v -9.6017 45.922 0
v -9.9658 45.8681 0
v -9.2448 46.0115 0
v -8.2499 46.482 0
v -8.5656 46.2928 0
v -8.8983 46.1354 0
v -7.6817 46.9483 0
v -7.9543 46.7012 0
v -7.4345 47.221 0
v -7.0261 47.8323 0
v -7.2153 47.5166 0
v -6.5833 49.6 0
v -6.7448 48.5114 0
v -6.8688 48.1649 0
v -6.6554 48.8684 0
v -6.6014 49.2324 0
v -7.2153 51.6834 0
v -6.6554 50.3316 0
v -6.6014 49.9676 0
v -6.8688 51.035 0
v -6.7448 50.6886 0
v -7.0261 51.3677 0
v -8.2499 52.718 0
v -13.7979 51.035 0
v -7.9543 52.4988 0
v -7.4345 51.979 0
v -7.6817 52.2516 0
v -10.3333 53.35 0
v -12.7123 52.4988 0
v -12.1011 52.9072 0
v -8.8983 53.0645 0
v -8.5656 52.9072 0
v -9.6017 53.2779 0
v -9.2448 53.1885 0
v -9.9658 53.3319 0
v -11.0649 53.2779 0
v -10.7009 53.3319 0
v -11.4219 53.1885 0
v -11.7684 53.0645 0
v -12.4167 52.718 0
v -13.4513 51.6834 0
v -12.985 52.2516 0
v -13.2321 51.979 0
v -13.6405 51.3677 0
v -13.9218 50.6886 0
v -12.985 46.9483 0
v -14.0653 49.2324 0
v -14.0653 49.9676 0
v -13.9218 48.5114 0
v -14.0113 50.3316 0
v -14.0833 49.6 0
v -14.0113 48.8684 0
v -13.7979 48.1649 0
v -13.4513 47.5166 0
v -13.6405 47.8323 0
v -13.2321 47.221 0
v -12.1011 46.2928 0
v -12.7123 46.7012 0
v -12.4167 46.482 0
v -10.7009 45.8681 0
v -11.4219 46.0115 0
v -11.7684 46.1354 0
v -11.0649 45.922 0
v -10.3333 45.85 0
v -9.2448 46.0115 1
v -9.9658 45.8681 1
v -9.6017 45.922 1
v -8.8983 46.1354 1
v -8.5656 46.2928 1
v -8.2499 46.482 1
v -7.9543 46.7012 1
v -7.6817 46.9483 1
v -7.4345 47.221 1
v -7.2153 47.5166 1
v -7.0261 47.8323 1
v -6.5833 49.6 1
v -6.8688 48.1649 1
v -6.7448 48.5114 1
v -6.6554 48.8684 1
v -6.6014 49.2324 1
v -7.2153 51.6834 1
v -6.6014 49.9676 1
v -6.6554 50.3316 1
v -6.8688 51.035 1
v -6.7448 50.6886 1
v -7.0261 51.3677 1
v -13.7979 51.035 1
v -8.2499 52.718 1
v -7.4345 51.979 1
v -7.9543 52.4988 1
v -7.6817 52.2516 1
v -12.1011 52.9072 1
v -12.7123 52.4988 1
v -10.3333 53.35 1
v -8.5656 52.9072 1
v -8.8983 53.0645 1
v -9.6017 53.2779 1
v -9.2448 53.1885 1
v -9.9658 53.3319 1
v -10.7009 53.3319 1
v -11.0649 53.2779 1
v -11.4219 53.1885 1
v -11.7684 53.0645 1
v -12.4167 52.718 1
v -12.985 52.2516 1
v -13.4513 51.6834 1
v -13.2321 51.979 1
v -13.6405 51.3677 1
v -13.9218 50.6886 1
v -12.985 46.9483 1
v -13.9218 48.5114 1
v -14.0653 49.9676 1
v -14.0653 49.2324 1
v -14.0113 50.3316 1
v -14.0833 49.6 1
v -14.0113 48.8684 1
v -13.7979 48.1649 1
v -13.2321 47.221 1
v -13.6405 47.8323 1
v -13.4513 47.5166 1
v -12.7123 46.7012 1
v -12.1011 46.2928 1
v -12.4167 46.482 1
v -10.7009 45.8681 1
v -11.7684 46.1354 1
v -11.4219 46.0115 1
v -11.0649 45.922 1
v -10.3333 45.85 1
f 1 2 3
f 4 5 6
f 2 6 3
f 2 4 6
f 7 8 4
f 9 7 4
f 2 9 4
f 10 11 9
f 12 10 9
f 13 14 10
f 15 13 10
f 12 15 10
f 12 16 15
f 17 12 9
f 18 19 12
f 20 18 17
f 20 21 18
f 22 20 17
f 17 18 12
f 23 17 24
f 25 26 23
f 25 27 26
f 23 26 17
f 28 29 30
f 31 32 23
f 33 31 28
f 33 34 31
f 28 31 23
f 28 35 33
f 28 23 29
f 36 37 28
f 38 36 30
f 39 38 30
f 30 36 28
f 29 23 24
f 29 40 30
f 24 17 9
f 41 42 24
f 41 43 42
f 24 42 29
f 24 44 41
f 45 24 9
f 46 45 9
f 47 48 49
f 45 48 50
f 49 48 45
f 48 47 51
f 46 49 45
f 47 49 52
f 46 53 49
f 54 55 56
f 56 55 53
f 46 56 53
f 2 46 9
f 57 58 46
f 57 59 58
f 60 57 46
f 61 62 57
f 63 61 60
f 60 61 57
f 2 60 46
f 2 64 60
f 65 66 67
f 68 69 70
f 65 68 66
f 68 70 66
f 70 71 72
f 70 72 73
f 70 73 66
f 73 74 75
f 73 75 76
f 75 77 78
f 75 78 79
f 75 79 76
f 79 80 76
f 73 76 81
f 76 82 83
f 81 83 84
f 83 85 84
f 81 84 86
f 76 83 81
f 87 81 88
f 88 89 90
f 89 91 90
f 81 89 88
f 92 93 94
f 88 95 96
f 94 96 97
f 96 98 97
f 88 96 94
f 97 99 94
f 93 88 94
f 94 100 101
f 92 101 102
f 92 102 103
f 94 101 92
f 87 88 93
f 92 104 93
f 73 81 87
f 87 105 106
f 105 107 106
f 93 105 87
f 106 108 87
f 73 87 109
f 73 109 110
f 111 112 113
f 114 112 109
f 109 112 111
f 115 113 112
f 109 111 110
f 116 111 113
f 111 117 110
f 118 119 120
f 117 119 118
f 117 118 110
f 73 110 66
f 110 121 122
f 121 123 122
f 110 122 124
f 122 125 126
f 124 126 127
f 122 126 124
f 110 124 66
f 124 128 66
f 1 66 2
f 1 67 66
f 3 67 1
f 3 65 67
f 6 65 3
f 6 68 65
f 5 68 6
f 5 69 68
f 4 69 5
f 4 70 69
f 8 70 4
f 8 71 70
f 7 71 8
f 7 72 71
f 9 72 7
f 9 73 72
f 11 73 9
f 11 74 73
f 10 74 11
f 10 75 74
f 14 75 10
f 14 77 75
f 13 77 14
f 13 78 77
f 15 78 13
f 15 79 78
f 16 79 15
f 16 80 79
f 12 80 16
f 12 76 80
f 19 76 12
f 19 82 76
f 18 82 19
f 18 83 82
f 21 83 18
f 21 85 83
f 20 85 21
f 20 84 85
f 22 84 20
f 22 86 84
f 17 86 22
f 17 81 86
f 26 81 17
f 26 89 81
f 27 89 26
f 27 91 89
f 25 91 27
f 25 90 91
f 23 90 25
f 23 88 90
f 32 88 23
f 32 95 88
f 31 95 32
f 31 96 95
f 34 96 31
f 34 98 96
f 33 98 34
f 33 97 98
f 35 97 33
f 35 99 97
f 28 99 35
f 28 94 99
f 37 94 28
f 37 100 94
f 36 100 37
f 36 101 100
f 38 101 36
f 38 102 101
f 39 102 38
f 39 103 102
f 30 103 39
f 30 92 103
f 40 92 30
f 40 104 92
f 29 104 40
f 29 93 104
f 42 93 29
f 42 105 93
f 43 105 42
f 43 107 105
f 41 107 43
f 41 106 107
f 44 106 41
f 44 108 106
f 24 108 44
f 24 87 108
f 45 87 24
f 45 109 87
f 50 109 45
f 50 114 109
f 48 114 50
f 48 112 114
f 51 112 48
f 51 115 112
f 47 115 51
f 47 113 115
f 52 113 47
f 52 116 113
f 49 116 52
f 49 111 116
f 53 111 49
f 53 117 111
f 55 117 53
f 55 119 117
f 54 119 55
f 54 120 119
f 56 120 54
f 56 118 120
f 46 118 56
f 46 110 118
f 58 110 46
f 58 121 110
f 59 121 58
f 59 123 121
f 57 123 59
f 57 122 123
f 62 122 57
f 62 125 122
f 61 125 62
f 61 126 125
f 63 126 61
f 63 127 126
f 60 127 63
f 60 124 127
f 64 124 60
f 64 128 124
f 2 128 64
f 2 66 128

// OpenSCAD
/* ==========================================================================

   Parametric Themed Name Sign and Keychain
   Designed by Notydesign
   License: CC BY-NC-SA 4.0 (https://creativecommons.org/licenses/by-nc-sa/4.0/)
   Source: https://github.com/Noty-design/Parametric-designs

   DESCRIPTION
   -----------
   Customizable raised-letter sign with a rounded Spider-Man theme or a
   pixel-corner Minecraft theme, or three unicorn layouts. Each supports a door sign or a
   keychain, optional mounting holes, and separately colored relief layers.

   All dimensions are in millimeters. X runs along the sign, Y is its height,
   and Z is the extrusion direction (the back of the sign is at Z = 0).
   Colors are for preview and compatible multicolor export workflows; an STL
   does not store colors.

   This file is deliberately documented for safe parameter and geometry edits.
   ========================================================================== */

/* [Main settings] */
// The displayed name; leave empty for a sign with decorative graphics only.
name_text = "ELLA";
// Select a wall/door sign or a keychain with an integral attachment tab.
plate_type = "door_sign"; // [door_sign:Door sign, keychain:Keychain]
// Select the theme used for the base outline and raised graphics.
theme = "unicorn"; // [spiderman:Spider-Man, minecraft:Minecraft, unicorn:Unicorn]

/* [Unicorn graphics] */
// Select the complete unicorn silhouette, a head above the sign, or an inset motif.
unicorn_variant = "full_horse"; // [full_horse:Full unicorn, head_top:Head above sign, inside:Unicorn inside sign]
// Display small decorative sparkles.
unicorn_show_stars = true;
// Select the facial expression for every unicorn layout.
unicorn_eye_style = "closed"; // [closed:Closed eyes, open:Open eyes]
// Add a small swept eyelash to either eye expression.
unicorn_eye_lashes = true;
// Choose an attached loop or a hole in the artwork. Neck and mane use layout-specific anchors.
unicorn_keyhole_position = "loop"; // [loop:External loop, neck:Neck, mane:Mane]
// Move the hole or loop horizontally (mm). Near an edge, the base grows locally to support the hole.
unicorn_keyhole_offset_x = 0; // [-30:0.5:30]
// Move the hole or loop vertically (mm).
unicorn_keyhole_offset_y = 0; // [-30:0.5:30]
// Horizontal name position adjustment (mm).
unicorn_text_offset_x = 0; // [-40:0.5:40]
// Vertical name position adjustment (mm).
unicorn_text_offset_y = 0; // [-25:0.5:25]
// Relative size of the head for the two plate layouts.
unicorn_motif_scale = 100; // [70:5:120]

/* [Spider-Man graphics] */
// Select the stylized spider emblem or mask motif.
spiderman_motif = "emblem"; // [emblem:Spider emblem, mask:Mask]
// Motif size relative to its theme-specific reference size; zero hides it.
motif_scale_percent = 0; // [0:5:220]
// Horizontal offset of the motif (mm).
motif_offset_x = 0; // [-70:1:70]
// Vertical offset of the motif (mm).
motif_offset_y = 0; // [-20:1:20]
// Show the clipped radial web behind the name and motif.
show_spider_web = true;
// Horizontal adjustment of the name (mm).
spiderman_text_offset_x = 0; // [-40:0.5:40]
// Vertical adjustment of the name (mm).
spiderman_text_offset_y = 0; // [-25:0.5:25]

/* [Minecraft text] */
// Horizontal adjustment of the name (mm).
minecraft_text_offset_x = 0; // [-40:0.5:40]
// Vertical adjustment of the name (mm).
minecraft_text_offset_y = 0; // [-25:0.5:25]
// Keep moved text within the reserved text zone; disable for free placement.
minecraft_limit_text_position = true;

/* [Dimensions and mounting] */
// Derive plate width from the text-length estimate and use a preset height.
auto_size = true;
// Plate width when automatic sizing is disabled (mm).
manual_width = 140; // [50:5:250]
// Plate height when automatic sizing is disabled (mm).
manual_height = 48; // [20:2:100]
// Thickness of the backing plate (mm).
base_thickness = 3.2; // [2.0:0.2:8.0]
// Maximum height of raised text and decoration above the backing plate (mm).
relief_height = 1.5; // [0.6:0.2:3.0]
// Add two countersunk mounting holes to a door sign; ignored for keychains.
mount_holes = false;
// Through-hole diameter (mm).
hole_diameter = 4; // [2.5:0.5:6.0]

/* [Colors and appearance] */
// Apply the theme's default palette instead of the custom colors below.
use_theme_palette = true;
// Custom backing-plate color.
custom_base_color = "#C62828";
// Custom border, web, and emblem color.
custom_detail_color = "#141414";
// Custom raised-letter color.
custom_text_color = "#FFFFFF";
// Custom eye and experience-bar color.
custom_accent_color = "#FFFFFF";

/* [Hidden] */
// Facet count affects circles and rounded edges only.
$fn = 48;

// Keep the theme palette values in one place for easy restyling.
spidey_base   = "#C62828";
spidey_detail = "#141414";
spidey_text   = "#FFFFFF";
spidey_accent = "#FFFFFF";
mc_base       = "#2E7D32";
mc_detail     = "#151515";
mc_text       = "#FFFFFF";
mc_accent     = "#81C784";

base_color   = use_theme_palette ? (theme == "spiderman" ? spidey_base   : mc_base)   : custom_base_color;
detail_color = use_theme_palette ? (theme == "spiderman" ? spidey_detail : mc_detail) : custom_detail_color;
text_color   = use_theme_palette ? (theme == "spiderman" ? spidey_text   : mc_text)   : custom_text_color;
accent_color = use_theme_palette ? (theme == "spiderman" ? spidey_accent : mc_accent) : custom_accent_color;

is_keychain = plate_type == "keychain";
has_text = len(name_text) > 0;
plate_h = auto_size ? (is_keychain ? 28 : 50) : manual_height;
font_size = is_keychain ? min(13, plate_h * 0.44) : min(25, plate_h * 0.46);

// Approximate name width conservatively: the chosen font has variable glyph widths.
est_text_w = has_text ? max(1, len(name_text)) * font_size * 0.65 : 0;
mount_margin = (!is_keychain && mount_holes) ? 26 : 0;
badge_w = theme == "minecraft" ? (is_keychain ? 24 : 44) : (is_keychain ? 16 : 28);
auto_w = has_text
    ? max(is_keychain ? 65 : 125,
          badge_w + est_text_w + (is_keychain ? 16 : 28) + mount_margin)
    : (is_keychain ? 70 : 135);
plate_w = auto_size ? auto_w : manual_width;
border_w = is_keychain ? 1.5 : 2.5;
corner_radius = min(8, plate_h * 0.25);

// Reference motif heights (90 mm for the emblem, 42 mm for the mask) keep
// both motifs proportional to the chosen sign height.
motif_reference_h = spiderman_motif == "emblem" ? 90 : 42;
motif_height_fraction = spiderman_motif == "emblem"
    ? (is_keychain ? 0.82 : 0.88)
    : (is_keychain ? 0.78 : 0.84);
spidey_motif_scale = motif_scale_percent / 100 * plate_h * motif_height_fraction / motif_reference_h;

// Shared Minecraft coordinates prevent the detail outline and accent fill
// from drifting apart when dimensions or margins change.
function creeper_x() = -plate_w / 2 + (is_keychain ? 16 : 26);
function xp_x() = creeper_x() + (is_keychain ? 14 : 26);
function xp_width() = plate_w / 2 - xp_x()
    - (is_keychain ? 6 : (mount_holes ? 18 : 10));
function xp_y() = -plate_h / 2 + (is_keychain ? 5.5 : 8.5);
function xp_height() = is_keychain ? 2.2 : 3.6;
function text_position() = theme == "spiderman" ? [0, 0] : [
    ((-plate_w / 2 + (is_keychain ? 24 : 44))
     + (plate_w / 2 - (is_keychain ? 4 : (mount_holes ? 18 : 8)))) / 2,
    is_keychain ? 3.0 : 4.5
];

assert(plate_w > 2 * corner_radius && plate_h > 2 * corner_radius,
       "Plate dimensions must exceed twice the corner radius.");
assert(base_thickness > 0 && relief_height > 0,
       "Both extrusion heights must be positive.");
assert(hole_diameter > 0 && hole_diameter < plate_h,
       "Mounting-hole diameter must fit within the plate height.");

// --------------------------------------------------------------------------
// Model assembly: combine color-coded layers before subtracting all holes.
// --------------------------------------------------------------------------
if (theme == "unicorn") unicorn_nametag();
else nametag();

module nametag() {
    difference() {
        union() {
            color(base_color)
                linear_extrude(height = base_thickness)
                    base_plate_shape();

            color(detail_color)
                translate([0, 0, base_thickness])
                    linear_extrude(height = relief_height * 0.65)
                        details_layer_2d();

            color(accent_color)
                translate([0, 0, base_thickness])
                    linear_extrude(height = relief_height * 0.75)
                        accent_layer_2d();

            if (has_text) {
                // Dark outline is used for Spider-Man; Minecraft has no outline.
                if (theme == "spiderman")
                    color(detail_color)
                        translate([0, 0, base_thickness])
                            linear_extrude(height = relief_height * 0.88)
                                text_outline_2d();

                color(text_color)
                    translate([0, 0, base_thickness])
                        linear_extrude(height = relief_height)
                            text_core_2d();
            }
        }
        cutouts();
    }
}

// --------------------------------------------------------------------------
// Base and inner outlines for the two themes.
// --------------------------------------------------------------------------
module base_plate_shape() {
    if (theme == "minecraft") minecraft_plate_2d();
    else spiderman_plate_2d();
}

module inner_plate_shape() {
    if (theme == "minecraft") minecraft_plate_inner_2d();
    else spiderman_plate_inner_2d();
}

module spiderman_plate_2d() {
    union() {
        // Expand a centered rectangle to produce a plate with round corners.
        offset(r = corner_radius)
            square([plate_w - 2 * corner_radius,
                    plate_h - 2 * corner_radius], center = true);
        if (is_keychain)
            translate([-plate_w / 2 - 2, 0]) circle(d = 12);
    }
}

module spiderman_plate_inner_2d() {
    offset(r = corner_radius - border_w)
        square([plate_w - 2 * corner_radius,
                plate_h - 2 * corner_radius], center = true);
}

module minecraft_plate_2d() {
    step_size = is_keychain ? 2.5 : 4.5;
    union() {
        difference() {
            square([plate_w, plate_h], center = true);
            // The asymmetrical cutouts create a blocky pixel-corner pattern.
            for (sx = [-1, 1], sy = [-1, 1])
                translate([sx * plate_w / 2, sy * plate_h / 2]) {
                    translate([-sx * step_size * 0.5, -sy * step_size * 0.5])
                        square([step_size, step_size], center = true);
                    translate([-sx * step_size * 1.5, -sy * step_size * 0.25])
                        square([step_size, step_size * 0.5], center = true);
                    translate([-sx * step_size * 0.25, -sy * step_size * 1.5])
                        square([step_size * 0.5, step_size], center = true);
                }
        }
        if (is_keychain)
            translate([-plate_w / 2 - 2, 0]) square([11, 11], center = true);
    }
}

module minecraft_plate_inner_2d() {
    step_size = is_keychain ? 2.5 : 4.5;
    inner_w = plate_w - 2 * border_w;
    inner_h = plate_h - 2 * border_w;
    difference() {
        square([inner_w, inner_h], center = true);
        for (sx = [-1, 1], sy = [-1, 1])
            translate([sx * inner_w / 2, sy * inner_h / 2])
                translate([-sx * step_size * 0.5, -sy * step_size * 0.5])
                    square([step_size, step_size], center = true);
    }
}

// Cut through the keychain tab or the two door-sign mounting positions.
module cutouts() {
    if (is_keychain) {
        translate([-plate_w / 2 - 2, 0, -1])
            cylinder(h = base_thickness + relief_height + 2, d = 4.5);
    } else if (mount_holes) {
        hole_x = plate_w / 2 - 9;
        for (sx = [-1, 1])
            translate([sx * hole_x, 0, -1]) {
                cylinder(h = base_thickness + 2, d = hole_diameter);
                // Two-level conical recess, measured from its bottom.
                translate([0, 0, base_thickness - 1.2])
                    cylinder(h = relief_height + 2,
                             d1 = hole_diameter, d2 = hole_diameter + 3.5);
            }
    }
}

// --------------------------------------------------------------------------
// Raised border and the chosen theme's dark graphical elements.
// --------------------------------------------------------------------------
module details_layer_2d() {
    difference() {
        base_plate_shape();
        inner_plate_shape();
    }
    if (theme == "spiderman") spiderman_theme_details();
    else minecraft_theme_details();
}

module spiderman_theme_details() {
    if (show_spider_web)
        intersection() {
            if (is_keychain || (spiderman_motif == "emblem" && motif_scale_percent > 0)) offset(delta=-0.02) inner_plate_shape(); else inner_plate_shape();
            spiderman_web_rays();
        }

    if (motif_scale_percent > 0)
        if (spiderman_motif == "emblem")
            intersection() {
                inner_plate_shape();
                translate([motif_offset_x, motif_offset_y])
                    scale([spidey_motif_scale, spidey_motif_scale])
                        insomniac_spider_emblem_2d();
            }
        else
            translate([motif_offset_x, motif_offset_y])
                scale([spidey_motif_scale, spidey_motif_scale])
                    spiderman_mask_details_2d();
}

// Stylized eight-legged emblem. The four right-side leg polygons are
// mirrored to the left to avoid duplicating their coordinates.
module insomniac_spider_emblem_2d() {
    union() {
        // Head and mandibles.
        polygon(points = [
            [0,16.5],[1.0,19.0],[2.4,21.6],[3.6,17.8],[3.8,15.0],
            [-3.8,15.0],[-3.6,17.8],[-2.4,21.6],[-1.0,19.0]
        ]);
        // Thorax.
        polygon(points = [
            [3.8,15.0],[5.4,11.5],[5.6,7.5],[4.6,4.0],
            [-4.6,4.0],[-5.6,7.5],[-5.4,11.5],[-3.8,15.0]
        ]);
        // Tapered abdomen with a small central bottom notch.
        polygon(points = [
            [4.4,4.0],[5.6,0.5],[5.8,-3.5],[4.8,-8.5],[3.2,-13.0],
            [1.5,-15.8],[0,-14.2],[-1.5,-15.8],[-3.2,-13.0],
            [-4.8,-8.5],[-5.8,-3.5],[-5.6,0.5],[-4.4,4.0]
        ]);
    }

    for (side = [0, 1]) mirror([side, 0, 0]) {
        // Upper inner leg.
        polygon(points = [[3.6, 15.0], [4.2, 16.6], [11.8, 25.8], [13.4, 29.5], [15.2, 38.0], [16.2, 45.0], [15.0, 36.5], [13.8, 28.5], [14.2, 22.8], [11.2, 21.8], [10.0, 23.5], [4.2, 13.8]]);
        // Upper outer leg.
        polygon(points = [[4.6, 12.8], [5.2, 14.2], [18.5, 24.8], [25.8, 28.5], [27.0, 36.5], [26.2, 26.5], [23.8, 17.5], [22.8, 18.8], [17.2, 22.2], [5.0, 10.6]]);
        // Lower outer leg.
        polygon(points = [
            [5.0,9.2],[5.5,10.4],[24.5,3.2],[28.5,-0.5],
            [23.5,-16.5],[19.5,-32.5],[21.2,-22.0],[24.8,-10.5],
            [26.5,-0.5],[22.8,2.0],[5.2,7.4]
        ]);
        // Lower inner leg.
        polygon(points = [
            [4.8,6.0],[5.2,7.2],[17.5,-4.5],[15.2,-18.0],
            [12.8,-32.0],[10.5,-45.0],[12.2,-33.0],[14.5,-19.0],
            [16.0,-5.5],[4.6,4.4]
        ]);
    }
}

// Mask contour, eye rims, and fine web lines.
module spiderman_mask_details_2d() {
    difference() {
        spiderman_head_contour();
        offset(r = -1.5) spiderman_head_contour();
    }
    for (side = [0, 1]) mirror([side, 0, 0]) spiderman_eye_rim();
    intersection() {
        spiderman_head_contour();
        union() {
            square([1.1, 46], center = true);
            for (angle = [24, 48, 72, 108, 132, 156])
                rotate([0, 0, angle]) square([44, 0.9], center = true);
            for (radius = [6, 12, 18, 24])
                difference() {
                    circle(r = radius);
                    circle(r = radius - 0.8);
                }
        }
    }
}

// Radial rays and concentric rings, cropped to the inner plate at call site.
module spiderman_web_rays() {
    line_w = is_keychain ? 0.7 : 1.1;
    max_diag = sqrt(plate_w * plate_w + plate_h * plate_h);
    translate([motif_offset_x, motif_offset_y]) {
        for (angle = [0:20:359])
            rotate([0, 0, angle])
                translate([0, -line_w / 2])
                    square([max_diag, line_w]);
        ring_spacing = is_keychain ? 5.5 : 9.0;
        for (ring_radius = [ring_spacing:ring_spacing:max_diag / 2])
            difference() {
                circle(r = ring_radius);
                circle(r = ring_radius - line_w);
            }
    }
}

module spiderman_head_contour() {
    hull() {
        translate([0, 5]) circle(r = 13);
        translate([0, -8]) circle(r = 9);
        translate([0, -15]) circle(r = 4.8);
    }
}

module spiderman_eye_rim() {
    polygon(points = [
        [2.0,-1.2],[3.4,4.2],[12.0,9.8],[15.0,7.2],
        [11.5,0.4],[5.2,-5.6],[2.4,-4.8]
    ]);
}

module spiderman_eye_white() {
    polygon(points = [
        [3.0,-0.8],[4.2,3.4],[11.0,8.0],[13.2,6.2],
        [10.2,0.8],[5.4,-4.2],[3.3,-3.6]
    ]);
}

// --------------------------------------------------------------------------
// Minecraft motif: an eight-cell Creeper face and a framed experience bar.
// --------------------------------------------------------------------------
module minecraft_theme_details() {
    pixel = is_keychain ? 1.8 : 3.4;
    translate([creeper_x(), 0]) {
        // One-cell border around the face grid.
        difference() {
            square([8 * pixel + 1.4, 8 * pixel + 1.4], center = true);
            square([8 * pixel, 8 * pixel], center = true);
        }
        translate([-4 * pixel, -4 * pixel]) {
            translate([1 * pixel, 4 * pixel]) square([2 * pixel, 2 * pixel]);
            translate([5 * pixel, 4 * pixel]) square([2 * pixel, 2 * pixel]);
            // Overlap the eye corners to avoid point-only pixel contacts.
            translate([3 * pixel - 0.02, 3 * pixel]) square([2 * pixel + 2 * 0.02, pixel + 0.02]);
            translate([2 * pixel, 1 * pixel]) square([4 * pixel, 2 * pixel]);
            translate([2 * pixel, 0 * pixel]) square([1 * pixel, 1 * pixel]);
            translate([5 * pixel, 0 * pixel]) square([1 * pixel, 1 * pixel]);
        }
    }
    if (xp_width() > 15)
        translate([xp_x() + xp_width() / 2, xp_y()]) {
            difference() {
                square([xp_width(), xp_height()], center = true);
                square([xp_width() - 0.9, xp_height() - 0.9], center = true);
            }
            tick_count = floor(xp_width() / (is_keychain ? 6 : 10));
            for (i = [1:tick_count])
                translate([-xp_width() / 2 + i * xp_width() / (tick_count + 1), 0])
                    square([0.6, xp_height()], center = true);
        }
}

// Raised accent graphics: white eye lenses or the green XP-bar fill.
module accent_layer_2d() {
    if (theme == "spiderman") {
        if (spiderman_motif == "mask" && motif_scale_percent > 0)
            translate([motif_offset_x, motif_offset_y])
                scale([spidey_motif_scale, spidey_motif_scale])
                    for (side = [0, 1])
                        mirror([side, 0, 0]) spiderman_eye_white();
    } else if (xp_width() > 15) {
        translate([xp_x() + xp_width() / 2, xp_y()])
            square([xp_width() - 1.2, xp_height() - 1.2], center = true);
    }
}

// Theme-specific fonts provide consistent text layouts.
// Approximate advances of the selected Liberation Sans Bold font, in cap-height units.
mc_glyphs = "ABCDEFGHIJKLMNOPQRSTUVWXYZabcdefghijklmnopqrstuvwxyz0123456789 -_ÅÄÖåäöÉé.";
mc_advances = [1.05, 1.05, 1.05, 1.05, 0.969, 0.888, 1.131, 1.05, 0.404, 0.808, 1.05, 0.888, 1.211, 1.05, 1.131, 0.969, 1.131, 1.05, 0.969, 0.888, 1.05, 0.969, 1.372, 0.969, 0.969, 0.888, 0.808, 0.888, 0.808, 0.888, 0.808, 0.484, 0.888, 0.888, 0.404, 0.404, 0.808, 0.404, 1.292, 0.888, 0.888, 0.888, 0.888, 0.566, 0.808, 0.484, 0.888, 0.808, 1.131, 0.808, 0.808, 0.727, 0.808, 0.808, 0.808, 0.808, 0.808, 0.808, 0.808, 0.808, 0.808, 0.808, 0.404, 0.484, 0.808, 1.05, 1.05, 1.131, 0.808, 0.808, 0.888, 0.969, 0.808, 0.404];
function mc_glyph_width(c) =
    let(matches=search(c,mc_glyphs,1))
    len(matches)>0 ? mc_advances[matches[0]] : 1.6;
function mc_name_units(i=0) =
    i>=len(name_text) ? 0 : mc_glyph_width(name_text[i])+mc_name_units(i+1);
function mc_text_left() = max(-plate_w/2+(is_keychain?24:44),
    creeper_x()+(is_keychain?8:14.5)+1.2);
function mc_text_right() = plate_w/2-(is_keychain?4:(mount_holes?18:8));
function mc_text_available() = max(1,mc_text_right()-mc_text_left());

// The text positions are relative to each theme's established layout.
// At zero offset, no clipping or automatic repositioning is applied.
module text_core_2d() {
    font_choice = theme == "spiderman"
        ? "Liberation Sans:style=Bold Italic"
        : "Liberation Sans:style=Bold";
    if (theme == "minecraft") {
        available = mc_text_available();
        fitted_size = min(font_size, available / max(0.1, mc_name_units() * 1.03));
        center_x = (mc_text_left() + mc_text_right()) / 2;
        center_y = text_position()[1];
        estimated_half_w = min(available / 2, mc_name_units() * fitted_size * 1.03 / 2);
        x_min = mc_text_left() + estimated_half_w;
        x_max = mc_text_right() - estimated_half_w;
        y_min = max(-plate_h / 2 + border_w + fitted_size * 0.55,
                    xp_y() + xp_height() / 2 + fitted_size * 0.55 + 0.8);
        y_max = plate_h / 2 - border_w - fitted_size * 0.55;
        x_requested = center_x + minecraft_text_offset_x;
        y_requested = center_y + minecraft_text_offset_y;
        // Zero offsets exactly preserve the accepted geometry, even if a
        // manually undersized plate leaves no safe movement interval.
        x_final = !minecraft_limit_text_position || minecraft_text_offset_x == 0
            ? x_requested : (x_min <= x_max ? min(max(x_requested, x_min), x_max) : center_x);
        y_final = !minecraft_limit_text_position || minecraft_text_offset_y == 0
            ? y_requested : (y_min <= y_max ? min(max(y_requested, y_min), y_max) : center_y);
        translate([x_final, y_final])
            text(text = name_text, size = fitted_size, font = font_choice,
                 halign = "center", valign = "center");
    } else
        translate([text_position()[0] + spiderman_text_offset_x,
                   text_position()[1] + spiderman_text_offset_y])
            text(text = name_text, size = font_size, font = font_choice,
                 halign = "center", valign = "center");
}

// Expand the final positioned text once to keep the outline aligned.
module text_outline_2d() {
    if (theme == "spiderman")
        offset(r = is_keychain ? 1.0 : 1.6)
            text_core_2d();
}


// ==========================================================================
// UNICORN THEME
// Self-contained geometry: the original two themes remain unchanged.
// Curved outlines are sampled from cubic Bezier segments. No external SVGs,
// font icons, or mesh imports are required.
// ==========================================================================
function u_bezier(p0,p1,p2,p3,t) =
    (1-t)*(1-t)*(1-t)*p0 + 3*(1-t)*(1-t)*t*p1 +
    3*(1-t)*t*t*p2 + t*t*t*p3;

module u_curve(start,segments) {
    polygon(concat([start],[
        for(i=[0:len(segments)-1], j=[1:12])
            u_bezier(i==0?start:segments[i-1][2],
                segments[i][0],segments[i][1],segments[i][2],j/12)
    ]));
}

module u_stroke(points,w=1.8) {
    for(i=[0:len(points)-2])
        hull() {
            translate(points[i]) circle(d=w,$fn=20);
            translate(points[i+1]) circle(d=w,$fn=20);
        }
}

module u_sparkle(r=3) {
    polygon([for(i=[0:7]) let(a=90+i*45,rr=i%2==0?r:r*0.31)
        [rr*cos(a),rr*sin(a)]]);
}



















// A tiny geometric seed survives only when the complete star fits.
// Hulls reconstruct its eight wedges instead of clipping the star itself.
module u_star_seed(p,r) {
    intersection() {
        square([0.02,0.02],center=true);
        translate(-p) offset(r=-(r+0.05/u_fs)) u_horse_star_space();
    }
}
function u_star_point(r,i) =
    let(a=90+i*45,rr=i%2==0?r:r*0.31) [rr*cos(a),rr*sin(a)];
module u_whole_star(p,r) {
    if (r*u_fs >= 1.4)
        translate(p)
            for (i=[0:7])
                hull() {
                    u_star_seed(p,r);
                    translate(u_star_point(r,i)) u_star_seed(p,r);
                    translate(u_star_point(r,i+1)) u_star_seed(p,r);
                }
}


// Layout values are independent of the Spider-Man/Minecraft calculations.
u_full = unicorn_variant=="full_horse";
u_top = unicorn_variant=="head_top";
u_inside = unicorn_variant=="inside";
u_chars = max(1,len(name_text));
u_h = auto_size ? (is_keychain?28:50) : manual_height;
u_mount = !is_keychain && mount_holes;
u_border = is_keychain?1.4:2.2;
u_r = min(u_h/4,8);
u_head_ref_h = 56;
u_head_ref_w = 76;
u_width = auto_size ?
    (u_full ? (is_keychain?max(72,min(115,50+u_chars*4)):
                 max(155,min(250,105+u_chars*12))) :
        max(is_keychain?70:125,
            (is_keychain?9:16)*u_chars*.85+
            (u_inside?(is_keychain?28:44):0)+
            (u_mount?36:20))) : manual_width;
// Full horse has a fixed aspect ratio; manual width controls its total size.
u_fs = (u_full && is_keychain ? max(72,u_width) : u_width)/150;
u_factor = unicorn_motif_scale/100;
u_hs = u_top ? min(u_h*.95/u_head_ref_h*u_factor,u_width*.68/u_head_ref_w) :
    min((u_h-2*(u_border+2))/u_head_ref_h*u_factor,u_width*.36/u_head_ref_w);
u_left = -u_width/2+(u_mount?17:0)+u_border+3;
u_head_x = u_top?0:u_left+38*u_hs;
u_head_y = u_top?u_h/2-5:-24*u_hs;
u_text_left = u_inside?u_head_x+38*u_hs+4:
    -u_width/2+u_border+(u_mount?16:5);
u_text_right = u_width/2-u_border-(u_mount?16:5);
u_text_w = max(1,u_text_right-u_text_left);
u_text_x = (u_full?-3*u_fs:(u_text_left+u_text_right)/2) + unicorn_text_offset_x;
u_text_y = (u_full?3*u_fs:0) + unicorn_text_offset_y;
u_font = u_full?min(18,(u_mount?52:70)/u_chars)*u_fs:
    min(u_h*.44,u_text_w/(u_chars*.88));
u_outline = is_keychain?.55:.85;

u_base_color = use_theme_palette?"#FBE7F4":custom_base_color;
u_dark_color = use_theme_palette?"#653884":custom_detail_color;
u_name_color = use_theme_palette?"#FFFFFF":custom_text_color;
u_gold_color = use_theme_palette?"#F2B84D":custom_accent_color;

module u_scaled_head() {
    translate([u_head_x,u_head_y]) scale([u_hs,u_hs]) children();
}
module u_scaled_horse() {
    scale([u_fs,u_fs]) children();
}
module u_round_plate() {
    offset(r=u_r) square([u_width-2*u_r,u_h-2*u_r],center=true);
}
// Keychain attachment anchors and adjustable hole location.
function u_keyhole_anchor() = u_full ?
    [-24,36]*u_fs : [-u_width/2+4,0];
function u_keyhole_default() =
    unicorn_keyhole_position=="loop" ?
        (u_full ? [-10,48]*u_fs : [-u_width/2-2,0]) :
    u_full ?
        (unicorn_keyhole_position=="mane" ? [-20,36] : [-24,30])*u_fs :
        [u_head_x,u_head_y]+
            (unicorn_keyhole_position=="mane" ? [17.5,10] : [13.5,6])*u_hs;
function u_keyhole_xy() = u_keyhole_default()+
    [unicorn_keyhole_offset_x,unicorn_keyhole_offset_y];

// Connect the movable loop to a stable anchor; the 12 mm boss has a 4.5 mm hole.
// The support is invisible inside the existing base. If a user moves the
// hole close to or beyond the edge, a rounded local extension keeps it attached.
module u_keyhole_support() {
    hull() {
        translate(u_keyhole_default()) circle(d=7.7,$fn=64);
        translate(u_keyhole_xy()) circle(d=7.7,$fn=64);
    }
}

module u_keychain_loop() {
    hull() {
        translate(u_keyhole_anchor()) circle(d=7.5,$fn=64);
        translate(u_keyhole_xy()) circle(d=12,$fn=64);
    }
}
module u_base() {
    union() {
        if(u_full) u_scaled_horse() u_horse_shape();
        else {
            u_round_plate();
            if(u_top) u_scaled_head() u_head_shape();
        }
        if(is_keychain) {
            if(unicorn_keyhole_position=="loop") u_keychain_loop();
            else u_keyhole_support();
        }
    }
}
module u_border_shape() {
    difference() {
        u_round_plate();
        offset(delta=-u_border) u_round_plate();
        if(u_top) u_scaled_head() u_head_shape();
    }
}
module u_name() {
    translate([u_text_x,u_text_y])
        text(name_text,size=u_font,font="Liberation Sans:style=Bold",
            halign="center",valign="center");
}
module u_dark() {
    // Close tangential contacts in the assembled inset artwork.
    if (u_inside) offset(delta=-0.16) offset(delta=0.16) u_dark_raw();
    else u_dark_raw();
}
module u_dark_raw() {
    if(u_full) u_scaled_horse() u_horse_dark();
    else {
        u_border_shape();
        u_scaled_head() u_head_dark();
    }
    if(has_text) offset(r=u_outline) u_name();
}
module u_gold() {
    if(u_full) u_scaled_horse() u_horse_gold();
    else {
        u_scaled_head() u_head_gold();
        if(unicorn_show_stars && u_h>=26) {
            translate([u_text_x-u_text_w*.32,-u_h/2+u_border+4])
                u_sparkle(is_keychain?1.8:2.8);
            translate([u_text_x+u_text_w*.32,u_h/2-u_border-4])
                u_sparkle(is_keychain?1.8:2.8);
        }
    }
}
module u_highlights() {
    if(u_full) u_scaled_horse() u_horse_highlights();
    else u_scaled_head() u_head_highlights();
}
module u_holes() {
    if(is_keychain)
        translate(concat(u_keyhole_xy(),[-1]))
            cylinder(h=base_thickness+relief_height+2,d=4.5,$fn=64);
    else if(mount_holes)
        for(x=u_full?[-23*u_fs,23*u_fs]:[-u_width/2+9,u_width/2-9])
            translate([x,u_full?-2*u_fs:0,-1])
                cylinder(h=base_thickness+relief_height+2,d=hole_diameter);
}
module u_clipped() {
    intersection() { u_base(); children(); }
}
module unicorn_nametag() {
    linear_extrude(height=1) difference() {
        translate(u_keyhole_xy()) circle(r=3.75,$fn=64);
        u_base();
    }
}


// Complete unicorn silhouette and matching relief artwork.
module u_horse_shape() {
    offset(r=0.35) offset(delta=-0.35)
        polygon([[-75,71.64],[-50.48,50.37],[-52.33,47.97],[-53.8,47.58],[-52.02,46.50],[-49.63,46.73],[-49.86,44.49],[-48.08,42.01],[-50.86,34.28],[-52.49,32.58],[-53.34,30.64],[-53.18,27.47],[-51.87,25.30],[-49.24,24.38],[-46.69,24.92],[-45.53,26.16],[-44.91,28.09],[-40.58,29.87],[-35.86,34.51],[-33.46,32.50],[-32.14,29.79],[-31.83,26.23],[-32.53,22.75],[-36.55,14.40],[-37.48,11.38],[-37.48,8.36],[-35.70,2.17],[-35.86,0.16],[-36.78,-0.46],[-45.68,0.16],[-50.86,-0.30],[-51.95,-1.77],[-54.27,-8.97],[-57.67,-15.77],[-54.58,-26.84],[-53.57,-27.53],[-51.56,-25.91],[-50.71,-23.51],[-51.10,-20.11],[-51.64,-19.41],[-53.26,-19.41],[-53.26,-18.25],[-49.94,-9.12],[-47.46,-5.25],[-43.21,-6.10],[-32.84,-10.20],[-28.74,-8.50],[-27.58,-8.50],[-25.64,-10.51],[-24.72,-14.15],[-24.79,-18.17],[-26.11,-23.12],[-29.13,-30.08],[-29.20,-34.88],[-33.46,-45.40],[-37.71,-50.82],[-39.03,-54.53],[-33.38,-55.30],[-31.83,-54.92],[-31.37,-52.91],[-31.83,-50.12],[-29.59,-47.65],[-28.82,-41.61],[-23.71,-33.33],[-22.55,-28.46],[-19.77,-22.50],[-17.14,-14.23],[-6.46,-14.07],[2.75,-12.99],[6.54,-18.09],[8.86,-25.91],[12.96,-35.11],[12.88,-39.29],[10.64,-46.33],[8.86,-49.97],[6.30,-51.98],[4.68,-55.92],[10.25,-55.77],[10.87,-53.29],[11.87,-52.67],[13.04,-50.58],[19.30,-33.49],[18.99,-31.24],[16.21,-26.22],[15.05,-21.03],[15.51,-16.16],[18.14,-8.27],[19.15,-7.50],[32.61,-17.63],[36.17,-21.03],[44.13,-33.41],[46.92,-42.38],[50.32,-48.73],[54.65,-53.14],[56.36,-52.21],[57.75,-50.04],[57.59,-47.88],[55.58,-45.01],[53.18,-44.63],[46.53,-30.24],[44.75,-22.58],[42.28,-20.57],[39.41,-15.15],[37.79,-10.51],[37.48,-5.64],[36.47,-1.07],[32.22,10.68],[34,10.22],[35.31,8.90],[36.86,2.72],[40.11,-1.46],[45.84,-5.10],[51.17,-6.88],[52.10,-11.05],[55.20,-15.23],[57.75,-16.93],[61.38,-18.09],[64.25,-17.78],[66.18,-15.85],[68.73,-16.39],[71.36,-19.33],[72.45,-24.36],[73.84,-22.74],[74.69,-20.26],[74.38,-16.86],[72.45,-12.91],[74.69,-10.13],[74.54,-6.64],[73.76,-5.25],[70.59,-8.50],[67.96,-9.58],[66.10,-9.43],[63.86,-8.04],[63.16,-6.57],[63.40,-0.46],[62,3.41],[59.30,6.35],[55.20,7.98],[57.28,8.83],[58.29,10.14],[58.60,12.54],[57.83,15.56],[56.20,12.70],[54.27,12.70],[52.33,14.86],[49.24,20.35],[47.46,21.82],[44.44,22.75],[40.88,22.67],[37.33,21.75],[34.85,20.28],[31.52,17.26],[28.74,16.56],[24.10,19.81],[18.45,21.13],[11.33,20.90],[0.19,18.96],[-2.20,22.06],[-4.37,22.67],[-6.69,22.60],[-7.77,23.37],[-7.54,33.66],[-8.86,36.83],[-11.10,39.38],[-9.01,40.62],[-8.08,43.41],[-8.78,42.56],[-10.33,42.17],[-13.27,42.48],[-14.74,43.17],[-16.05,44.80],[-18.06,49.44],[-19.53,51.14],[-23.32,53.08],[-26.96,53.39],[-26.26,54.31],[-26.26,55.63],[-27.58,57.80],[-30.44,58.88],[-29.36,57.56],[-29.28,56.25],[-30.29,54.93],[-31.52,54.47],[-37.64,55.01],[-40.19,54.24],[-44.37,56.71],[-43.98,55.09],[-44.29,52.23]]);
}
module u_horse_horn() {
    intersection() {
        u_horse_shape();
        polygon([[-80,75],[-43,52],[-50,49],[-76,67]]);
    }
}
module u_horse_mane() {
    intersection() {
        u_horse_shape();
        u_curve([-54,47],[
            [[-49,56],[-41,60],[-32,60]],
            [[-13,61],[-5,48],[-5,38]],
            [[-4,30],[-5,24],[1,19]],
            [[-9,16],[-18,24],[-20,32]],
            [[-23,43],[-30,48],[-37,48]],
            [[-42,47],[-48,42],[-54,47]]
        ]);
    }
}
module u_horse_tail() {
    intersection() {
        u_horse_shape();
        u_curve([28.5,16.5],[
            [[40,29],[72,26],[79,11]],
            [[85,-1],[84,-22],[72,-28]],
            [[53,-28],[37,-6],[32,10]],
            [[30,13],[29,15],[28.5,16.5]]
        ]);
    }
}
module u_horse_dark() {
    difference() {
        union() {
            u_horse_mane();
            u_horse_tail();
            if(unicorn_eye_style=="open") {
                translate([-42.8,40.65]) rotate(-22) scale([1.95,2.55]) circle(r=1,$fn=48);
                if(unicorn_eye_lashes) u_stroke([[-41.35,42.0],[-40.55,42.55],[-40.1,43.1]],0.72);
            } else {
                u_stroke([for(t=[0:0.05:1]) u_bezier([-45.0,41.4],[-43.5,39.5],[-41.5,39.65],[-39.8,41.5],t)],1.05);
                if(unicorn_eye_lashes) u_stroke([[-40.6,40.9],[-39.4,42.1]],0.75);
            }
            translate([-50.1,31.3]) rotate(-25) scale([1.2,0.7]) circle(r=1,$fn=28);
            u_stroke([for(t=[0:0.05:1]) u_bezier([-51.0, 28.1],[-49.5, 27.25],[-47.5, 27.4],[-46.25, 28.8],t)],0.95);
            polygon([[-57,-21],[-49,-20],[-48,-31],[-58,-31]]);
            polygon([[-41,-49],[-30,-49],[-30,-57],[-41,-57]]);
            polygon([[4,-51],[13,-51],[13,-57],[4,-57]]);
            polygon([[49,-47],[59,-45],[61,-53],[53,-56]]);
        }
        u_horse_horn();
    }
}
module u_horse_highlights() {
    if(unicorn_eye_style=="open") translate([-43.35,41.55]) circle(r=0.78,$fn=32);
    for(t=[0.26,0.48,0.70]) {
        p=[-75+26*t,71.64-20*t];
        translate(p) rotate(-55) square([4.5,0.85],center=true);
    }
    u_stroke([for(t=[0:0.05:1]) u_bezier([-35,54],[-21,54],[-17,43],[-15,36],t)],1.45);
    u_stroke([for(t=[0:0.05:1]) u_bezier([-15,33],[-15,27],[-10,24],[-5,23],t)],1.45);
    u_stroke([for(t=[0:0.05:1]) u_bezier([36,17],[48,23],[48,8],[56,6],t)],1.6);
    u_stroke([for(t=[0:0.05:1]) u_bezier([45,8],[43,-1],[58,-4],[61,-13],t)],1.6);
    u_stroke([for(t=[0:0.05:1]) u_bezier([60,-9],[61,-16],[69,-15],[72,-19],t)],1.4);
}
module u_horse_star_space() {
    difference() {
        intersection() { offset(delta=-1.2) u_horse_shape(); translate([-3,3]) square([54,30],center=true); }
        if(has_text) scale([1/u_fs,1/u_fs]) offset(delta=0.8+u_outline) u_name();
        offset(delta=1) u_horse_dark();
    }
}
module u_horse_gold() {
    u_horse_horn();
    if(unicorn_show_stars)
        for(star=[[-21,13,2.3],[-8,15,2], [7,14,2.8],[21,12,2.1],[19,-8,2.2]])
            let(p=[star[0],star[1]],r=star[2])
                if(r*u_fs>=1.4)
                    u_whole_star(p,r);
}

// The full horse and both head layouts share one silhouette and artwork.
module u_head_region() {
    polygon([[-85,80],[4,80],[4,21],[0,19],[-8,17],[-21,16],[-36,17],[-85,17]]);
}
module u_head_local() {
    translate([37.5,-20]) intersection() { u_head_region(); children(); }
}
module u_head_shape() {
    u_head_local() u_horse_shape();
}
module u_head_dark() {
    difference() {
        union() {
            u_head_local() u_horse_dark();
            // Outline makes the pale head legible against the plate.
            if(u_inside) difference() { u_head_shape(); offset(delta=-1.05) u_head_shape(); }
        }
        u_head_gold();
    }
}
module u_head_gold() {
    u_head_local() u_horse_horn();
}
module u_head_highlights() {
    u_head_local() u_horse_highlights();
}
